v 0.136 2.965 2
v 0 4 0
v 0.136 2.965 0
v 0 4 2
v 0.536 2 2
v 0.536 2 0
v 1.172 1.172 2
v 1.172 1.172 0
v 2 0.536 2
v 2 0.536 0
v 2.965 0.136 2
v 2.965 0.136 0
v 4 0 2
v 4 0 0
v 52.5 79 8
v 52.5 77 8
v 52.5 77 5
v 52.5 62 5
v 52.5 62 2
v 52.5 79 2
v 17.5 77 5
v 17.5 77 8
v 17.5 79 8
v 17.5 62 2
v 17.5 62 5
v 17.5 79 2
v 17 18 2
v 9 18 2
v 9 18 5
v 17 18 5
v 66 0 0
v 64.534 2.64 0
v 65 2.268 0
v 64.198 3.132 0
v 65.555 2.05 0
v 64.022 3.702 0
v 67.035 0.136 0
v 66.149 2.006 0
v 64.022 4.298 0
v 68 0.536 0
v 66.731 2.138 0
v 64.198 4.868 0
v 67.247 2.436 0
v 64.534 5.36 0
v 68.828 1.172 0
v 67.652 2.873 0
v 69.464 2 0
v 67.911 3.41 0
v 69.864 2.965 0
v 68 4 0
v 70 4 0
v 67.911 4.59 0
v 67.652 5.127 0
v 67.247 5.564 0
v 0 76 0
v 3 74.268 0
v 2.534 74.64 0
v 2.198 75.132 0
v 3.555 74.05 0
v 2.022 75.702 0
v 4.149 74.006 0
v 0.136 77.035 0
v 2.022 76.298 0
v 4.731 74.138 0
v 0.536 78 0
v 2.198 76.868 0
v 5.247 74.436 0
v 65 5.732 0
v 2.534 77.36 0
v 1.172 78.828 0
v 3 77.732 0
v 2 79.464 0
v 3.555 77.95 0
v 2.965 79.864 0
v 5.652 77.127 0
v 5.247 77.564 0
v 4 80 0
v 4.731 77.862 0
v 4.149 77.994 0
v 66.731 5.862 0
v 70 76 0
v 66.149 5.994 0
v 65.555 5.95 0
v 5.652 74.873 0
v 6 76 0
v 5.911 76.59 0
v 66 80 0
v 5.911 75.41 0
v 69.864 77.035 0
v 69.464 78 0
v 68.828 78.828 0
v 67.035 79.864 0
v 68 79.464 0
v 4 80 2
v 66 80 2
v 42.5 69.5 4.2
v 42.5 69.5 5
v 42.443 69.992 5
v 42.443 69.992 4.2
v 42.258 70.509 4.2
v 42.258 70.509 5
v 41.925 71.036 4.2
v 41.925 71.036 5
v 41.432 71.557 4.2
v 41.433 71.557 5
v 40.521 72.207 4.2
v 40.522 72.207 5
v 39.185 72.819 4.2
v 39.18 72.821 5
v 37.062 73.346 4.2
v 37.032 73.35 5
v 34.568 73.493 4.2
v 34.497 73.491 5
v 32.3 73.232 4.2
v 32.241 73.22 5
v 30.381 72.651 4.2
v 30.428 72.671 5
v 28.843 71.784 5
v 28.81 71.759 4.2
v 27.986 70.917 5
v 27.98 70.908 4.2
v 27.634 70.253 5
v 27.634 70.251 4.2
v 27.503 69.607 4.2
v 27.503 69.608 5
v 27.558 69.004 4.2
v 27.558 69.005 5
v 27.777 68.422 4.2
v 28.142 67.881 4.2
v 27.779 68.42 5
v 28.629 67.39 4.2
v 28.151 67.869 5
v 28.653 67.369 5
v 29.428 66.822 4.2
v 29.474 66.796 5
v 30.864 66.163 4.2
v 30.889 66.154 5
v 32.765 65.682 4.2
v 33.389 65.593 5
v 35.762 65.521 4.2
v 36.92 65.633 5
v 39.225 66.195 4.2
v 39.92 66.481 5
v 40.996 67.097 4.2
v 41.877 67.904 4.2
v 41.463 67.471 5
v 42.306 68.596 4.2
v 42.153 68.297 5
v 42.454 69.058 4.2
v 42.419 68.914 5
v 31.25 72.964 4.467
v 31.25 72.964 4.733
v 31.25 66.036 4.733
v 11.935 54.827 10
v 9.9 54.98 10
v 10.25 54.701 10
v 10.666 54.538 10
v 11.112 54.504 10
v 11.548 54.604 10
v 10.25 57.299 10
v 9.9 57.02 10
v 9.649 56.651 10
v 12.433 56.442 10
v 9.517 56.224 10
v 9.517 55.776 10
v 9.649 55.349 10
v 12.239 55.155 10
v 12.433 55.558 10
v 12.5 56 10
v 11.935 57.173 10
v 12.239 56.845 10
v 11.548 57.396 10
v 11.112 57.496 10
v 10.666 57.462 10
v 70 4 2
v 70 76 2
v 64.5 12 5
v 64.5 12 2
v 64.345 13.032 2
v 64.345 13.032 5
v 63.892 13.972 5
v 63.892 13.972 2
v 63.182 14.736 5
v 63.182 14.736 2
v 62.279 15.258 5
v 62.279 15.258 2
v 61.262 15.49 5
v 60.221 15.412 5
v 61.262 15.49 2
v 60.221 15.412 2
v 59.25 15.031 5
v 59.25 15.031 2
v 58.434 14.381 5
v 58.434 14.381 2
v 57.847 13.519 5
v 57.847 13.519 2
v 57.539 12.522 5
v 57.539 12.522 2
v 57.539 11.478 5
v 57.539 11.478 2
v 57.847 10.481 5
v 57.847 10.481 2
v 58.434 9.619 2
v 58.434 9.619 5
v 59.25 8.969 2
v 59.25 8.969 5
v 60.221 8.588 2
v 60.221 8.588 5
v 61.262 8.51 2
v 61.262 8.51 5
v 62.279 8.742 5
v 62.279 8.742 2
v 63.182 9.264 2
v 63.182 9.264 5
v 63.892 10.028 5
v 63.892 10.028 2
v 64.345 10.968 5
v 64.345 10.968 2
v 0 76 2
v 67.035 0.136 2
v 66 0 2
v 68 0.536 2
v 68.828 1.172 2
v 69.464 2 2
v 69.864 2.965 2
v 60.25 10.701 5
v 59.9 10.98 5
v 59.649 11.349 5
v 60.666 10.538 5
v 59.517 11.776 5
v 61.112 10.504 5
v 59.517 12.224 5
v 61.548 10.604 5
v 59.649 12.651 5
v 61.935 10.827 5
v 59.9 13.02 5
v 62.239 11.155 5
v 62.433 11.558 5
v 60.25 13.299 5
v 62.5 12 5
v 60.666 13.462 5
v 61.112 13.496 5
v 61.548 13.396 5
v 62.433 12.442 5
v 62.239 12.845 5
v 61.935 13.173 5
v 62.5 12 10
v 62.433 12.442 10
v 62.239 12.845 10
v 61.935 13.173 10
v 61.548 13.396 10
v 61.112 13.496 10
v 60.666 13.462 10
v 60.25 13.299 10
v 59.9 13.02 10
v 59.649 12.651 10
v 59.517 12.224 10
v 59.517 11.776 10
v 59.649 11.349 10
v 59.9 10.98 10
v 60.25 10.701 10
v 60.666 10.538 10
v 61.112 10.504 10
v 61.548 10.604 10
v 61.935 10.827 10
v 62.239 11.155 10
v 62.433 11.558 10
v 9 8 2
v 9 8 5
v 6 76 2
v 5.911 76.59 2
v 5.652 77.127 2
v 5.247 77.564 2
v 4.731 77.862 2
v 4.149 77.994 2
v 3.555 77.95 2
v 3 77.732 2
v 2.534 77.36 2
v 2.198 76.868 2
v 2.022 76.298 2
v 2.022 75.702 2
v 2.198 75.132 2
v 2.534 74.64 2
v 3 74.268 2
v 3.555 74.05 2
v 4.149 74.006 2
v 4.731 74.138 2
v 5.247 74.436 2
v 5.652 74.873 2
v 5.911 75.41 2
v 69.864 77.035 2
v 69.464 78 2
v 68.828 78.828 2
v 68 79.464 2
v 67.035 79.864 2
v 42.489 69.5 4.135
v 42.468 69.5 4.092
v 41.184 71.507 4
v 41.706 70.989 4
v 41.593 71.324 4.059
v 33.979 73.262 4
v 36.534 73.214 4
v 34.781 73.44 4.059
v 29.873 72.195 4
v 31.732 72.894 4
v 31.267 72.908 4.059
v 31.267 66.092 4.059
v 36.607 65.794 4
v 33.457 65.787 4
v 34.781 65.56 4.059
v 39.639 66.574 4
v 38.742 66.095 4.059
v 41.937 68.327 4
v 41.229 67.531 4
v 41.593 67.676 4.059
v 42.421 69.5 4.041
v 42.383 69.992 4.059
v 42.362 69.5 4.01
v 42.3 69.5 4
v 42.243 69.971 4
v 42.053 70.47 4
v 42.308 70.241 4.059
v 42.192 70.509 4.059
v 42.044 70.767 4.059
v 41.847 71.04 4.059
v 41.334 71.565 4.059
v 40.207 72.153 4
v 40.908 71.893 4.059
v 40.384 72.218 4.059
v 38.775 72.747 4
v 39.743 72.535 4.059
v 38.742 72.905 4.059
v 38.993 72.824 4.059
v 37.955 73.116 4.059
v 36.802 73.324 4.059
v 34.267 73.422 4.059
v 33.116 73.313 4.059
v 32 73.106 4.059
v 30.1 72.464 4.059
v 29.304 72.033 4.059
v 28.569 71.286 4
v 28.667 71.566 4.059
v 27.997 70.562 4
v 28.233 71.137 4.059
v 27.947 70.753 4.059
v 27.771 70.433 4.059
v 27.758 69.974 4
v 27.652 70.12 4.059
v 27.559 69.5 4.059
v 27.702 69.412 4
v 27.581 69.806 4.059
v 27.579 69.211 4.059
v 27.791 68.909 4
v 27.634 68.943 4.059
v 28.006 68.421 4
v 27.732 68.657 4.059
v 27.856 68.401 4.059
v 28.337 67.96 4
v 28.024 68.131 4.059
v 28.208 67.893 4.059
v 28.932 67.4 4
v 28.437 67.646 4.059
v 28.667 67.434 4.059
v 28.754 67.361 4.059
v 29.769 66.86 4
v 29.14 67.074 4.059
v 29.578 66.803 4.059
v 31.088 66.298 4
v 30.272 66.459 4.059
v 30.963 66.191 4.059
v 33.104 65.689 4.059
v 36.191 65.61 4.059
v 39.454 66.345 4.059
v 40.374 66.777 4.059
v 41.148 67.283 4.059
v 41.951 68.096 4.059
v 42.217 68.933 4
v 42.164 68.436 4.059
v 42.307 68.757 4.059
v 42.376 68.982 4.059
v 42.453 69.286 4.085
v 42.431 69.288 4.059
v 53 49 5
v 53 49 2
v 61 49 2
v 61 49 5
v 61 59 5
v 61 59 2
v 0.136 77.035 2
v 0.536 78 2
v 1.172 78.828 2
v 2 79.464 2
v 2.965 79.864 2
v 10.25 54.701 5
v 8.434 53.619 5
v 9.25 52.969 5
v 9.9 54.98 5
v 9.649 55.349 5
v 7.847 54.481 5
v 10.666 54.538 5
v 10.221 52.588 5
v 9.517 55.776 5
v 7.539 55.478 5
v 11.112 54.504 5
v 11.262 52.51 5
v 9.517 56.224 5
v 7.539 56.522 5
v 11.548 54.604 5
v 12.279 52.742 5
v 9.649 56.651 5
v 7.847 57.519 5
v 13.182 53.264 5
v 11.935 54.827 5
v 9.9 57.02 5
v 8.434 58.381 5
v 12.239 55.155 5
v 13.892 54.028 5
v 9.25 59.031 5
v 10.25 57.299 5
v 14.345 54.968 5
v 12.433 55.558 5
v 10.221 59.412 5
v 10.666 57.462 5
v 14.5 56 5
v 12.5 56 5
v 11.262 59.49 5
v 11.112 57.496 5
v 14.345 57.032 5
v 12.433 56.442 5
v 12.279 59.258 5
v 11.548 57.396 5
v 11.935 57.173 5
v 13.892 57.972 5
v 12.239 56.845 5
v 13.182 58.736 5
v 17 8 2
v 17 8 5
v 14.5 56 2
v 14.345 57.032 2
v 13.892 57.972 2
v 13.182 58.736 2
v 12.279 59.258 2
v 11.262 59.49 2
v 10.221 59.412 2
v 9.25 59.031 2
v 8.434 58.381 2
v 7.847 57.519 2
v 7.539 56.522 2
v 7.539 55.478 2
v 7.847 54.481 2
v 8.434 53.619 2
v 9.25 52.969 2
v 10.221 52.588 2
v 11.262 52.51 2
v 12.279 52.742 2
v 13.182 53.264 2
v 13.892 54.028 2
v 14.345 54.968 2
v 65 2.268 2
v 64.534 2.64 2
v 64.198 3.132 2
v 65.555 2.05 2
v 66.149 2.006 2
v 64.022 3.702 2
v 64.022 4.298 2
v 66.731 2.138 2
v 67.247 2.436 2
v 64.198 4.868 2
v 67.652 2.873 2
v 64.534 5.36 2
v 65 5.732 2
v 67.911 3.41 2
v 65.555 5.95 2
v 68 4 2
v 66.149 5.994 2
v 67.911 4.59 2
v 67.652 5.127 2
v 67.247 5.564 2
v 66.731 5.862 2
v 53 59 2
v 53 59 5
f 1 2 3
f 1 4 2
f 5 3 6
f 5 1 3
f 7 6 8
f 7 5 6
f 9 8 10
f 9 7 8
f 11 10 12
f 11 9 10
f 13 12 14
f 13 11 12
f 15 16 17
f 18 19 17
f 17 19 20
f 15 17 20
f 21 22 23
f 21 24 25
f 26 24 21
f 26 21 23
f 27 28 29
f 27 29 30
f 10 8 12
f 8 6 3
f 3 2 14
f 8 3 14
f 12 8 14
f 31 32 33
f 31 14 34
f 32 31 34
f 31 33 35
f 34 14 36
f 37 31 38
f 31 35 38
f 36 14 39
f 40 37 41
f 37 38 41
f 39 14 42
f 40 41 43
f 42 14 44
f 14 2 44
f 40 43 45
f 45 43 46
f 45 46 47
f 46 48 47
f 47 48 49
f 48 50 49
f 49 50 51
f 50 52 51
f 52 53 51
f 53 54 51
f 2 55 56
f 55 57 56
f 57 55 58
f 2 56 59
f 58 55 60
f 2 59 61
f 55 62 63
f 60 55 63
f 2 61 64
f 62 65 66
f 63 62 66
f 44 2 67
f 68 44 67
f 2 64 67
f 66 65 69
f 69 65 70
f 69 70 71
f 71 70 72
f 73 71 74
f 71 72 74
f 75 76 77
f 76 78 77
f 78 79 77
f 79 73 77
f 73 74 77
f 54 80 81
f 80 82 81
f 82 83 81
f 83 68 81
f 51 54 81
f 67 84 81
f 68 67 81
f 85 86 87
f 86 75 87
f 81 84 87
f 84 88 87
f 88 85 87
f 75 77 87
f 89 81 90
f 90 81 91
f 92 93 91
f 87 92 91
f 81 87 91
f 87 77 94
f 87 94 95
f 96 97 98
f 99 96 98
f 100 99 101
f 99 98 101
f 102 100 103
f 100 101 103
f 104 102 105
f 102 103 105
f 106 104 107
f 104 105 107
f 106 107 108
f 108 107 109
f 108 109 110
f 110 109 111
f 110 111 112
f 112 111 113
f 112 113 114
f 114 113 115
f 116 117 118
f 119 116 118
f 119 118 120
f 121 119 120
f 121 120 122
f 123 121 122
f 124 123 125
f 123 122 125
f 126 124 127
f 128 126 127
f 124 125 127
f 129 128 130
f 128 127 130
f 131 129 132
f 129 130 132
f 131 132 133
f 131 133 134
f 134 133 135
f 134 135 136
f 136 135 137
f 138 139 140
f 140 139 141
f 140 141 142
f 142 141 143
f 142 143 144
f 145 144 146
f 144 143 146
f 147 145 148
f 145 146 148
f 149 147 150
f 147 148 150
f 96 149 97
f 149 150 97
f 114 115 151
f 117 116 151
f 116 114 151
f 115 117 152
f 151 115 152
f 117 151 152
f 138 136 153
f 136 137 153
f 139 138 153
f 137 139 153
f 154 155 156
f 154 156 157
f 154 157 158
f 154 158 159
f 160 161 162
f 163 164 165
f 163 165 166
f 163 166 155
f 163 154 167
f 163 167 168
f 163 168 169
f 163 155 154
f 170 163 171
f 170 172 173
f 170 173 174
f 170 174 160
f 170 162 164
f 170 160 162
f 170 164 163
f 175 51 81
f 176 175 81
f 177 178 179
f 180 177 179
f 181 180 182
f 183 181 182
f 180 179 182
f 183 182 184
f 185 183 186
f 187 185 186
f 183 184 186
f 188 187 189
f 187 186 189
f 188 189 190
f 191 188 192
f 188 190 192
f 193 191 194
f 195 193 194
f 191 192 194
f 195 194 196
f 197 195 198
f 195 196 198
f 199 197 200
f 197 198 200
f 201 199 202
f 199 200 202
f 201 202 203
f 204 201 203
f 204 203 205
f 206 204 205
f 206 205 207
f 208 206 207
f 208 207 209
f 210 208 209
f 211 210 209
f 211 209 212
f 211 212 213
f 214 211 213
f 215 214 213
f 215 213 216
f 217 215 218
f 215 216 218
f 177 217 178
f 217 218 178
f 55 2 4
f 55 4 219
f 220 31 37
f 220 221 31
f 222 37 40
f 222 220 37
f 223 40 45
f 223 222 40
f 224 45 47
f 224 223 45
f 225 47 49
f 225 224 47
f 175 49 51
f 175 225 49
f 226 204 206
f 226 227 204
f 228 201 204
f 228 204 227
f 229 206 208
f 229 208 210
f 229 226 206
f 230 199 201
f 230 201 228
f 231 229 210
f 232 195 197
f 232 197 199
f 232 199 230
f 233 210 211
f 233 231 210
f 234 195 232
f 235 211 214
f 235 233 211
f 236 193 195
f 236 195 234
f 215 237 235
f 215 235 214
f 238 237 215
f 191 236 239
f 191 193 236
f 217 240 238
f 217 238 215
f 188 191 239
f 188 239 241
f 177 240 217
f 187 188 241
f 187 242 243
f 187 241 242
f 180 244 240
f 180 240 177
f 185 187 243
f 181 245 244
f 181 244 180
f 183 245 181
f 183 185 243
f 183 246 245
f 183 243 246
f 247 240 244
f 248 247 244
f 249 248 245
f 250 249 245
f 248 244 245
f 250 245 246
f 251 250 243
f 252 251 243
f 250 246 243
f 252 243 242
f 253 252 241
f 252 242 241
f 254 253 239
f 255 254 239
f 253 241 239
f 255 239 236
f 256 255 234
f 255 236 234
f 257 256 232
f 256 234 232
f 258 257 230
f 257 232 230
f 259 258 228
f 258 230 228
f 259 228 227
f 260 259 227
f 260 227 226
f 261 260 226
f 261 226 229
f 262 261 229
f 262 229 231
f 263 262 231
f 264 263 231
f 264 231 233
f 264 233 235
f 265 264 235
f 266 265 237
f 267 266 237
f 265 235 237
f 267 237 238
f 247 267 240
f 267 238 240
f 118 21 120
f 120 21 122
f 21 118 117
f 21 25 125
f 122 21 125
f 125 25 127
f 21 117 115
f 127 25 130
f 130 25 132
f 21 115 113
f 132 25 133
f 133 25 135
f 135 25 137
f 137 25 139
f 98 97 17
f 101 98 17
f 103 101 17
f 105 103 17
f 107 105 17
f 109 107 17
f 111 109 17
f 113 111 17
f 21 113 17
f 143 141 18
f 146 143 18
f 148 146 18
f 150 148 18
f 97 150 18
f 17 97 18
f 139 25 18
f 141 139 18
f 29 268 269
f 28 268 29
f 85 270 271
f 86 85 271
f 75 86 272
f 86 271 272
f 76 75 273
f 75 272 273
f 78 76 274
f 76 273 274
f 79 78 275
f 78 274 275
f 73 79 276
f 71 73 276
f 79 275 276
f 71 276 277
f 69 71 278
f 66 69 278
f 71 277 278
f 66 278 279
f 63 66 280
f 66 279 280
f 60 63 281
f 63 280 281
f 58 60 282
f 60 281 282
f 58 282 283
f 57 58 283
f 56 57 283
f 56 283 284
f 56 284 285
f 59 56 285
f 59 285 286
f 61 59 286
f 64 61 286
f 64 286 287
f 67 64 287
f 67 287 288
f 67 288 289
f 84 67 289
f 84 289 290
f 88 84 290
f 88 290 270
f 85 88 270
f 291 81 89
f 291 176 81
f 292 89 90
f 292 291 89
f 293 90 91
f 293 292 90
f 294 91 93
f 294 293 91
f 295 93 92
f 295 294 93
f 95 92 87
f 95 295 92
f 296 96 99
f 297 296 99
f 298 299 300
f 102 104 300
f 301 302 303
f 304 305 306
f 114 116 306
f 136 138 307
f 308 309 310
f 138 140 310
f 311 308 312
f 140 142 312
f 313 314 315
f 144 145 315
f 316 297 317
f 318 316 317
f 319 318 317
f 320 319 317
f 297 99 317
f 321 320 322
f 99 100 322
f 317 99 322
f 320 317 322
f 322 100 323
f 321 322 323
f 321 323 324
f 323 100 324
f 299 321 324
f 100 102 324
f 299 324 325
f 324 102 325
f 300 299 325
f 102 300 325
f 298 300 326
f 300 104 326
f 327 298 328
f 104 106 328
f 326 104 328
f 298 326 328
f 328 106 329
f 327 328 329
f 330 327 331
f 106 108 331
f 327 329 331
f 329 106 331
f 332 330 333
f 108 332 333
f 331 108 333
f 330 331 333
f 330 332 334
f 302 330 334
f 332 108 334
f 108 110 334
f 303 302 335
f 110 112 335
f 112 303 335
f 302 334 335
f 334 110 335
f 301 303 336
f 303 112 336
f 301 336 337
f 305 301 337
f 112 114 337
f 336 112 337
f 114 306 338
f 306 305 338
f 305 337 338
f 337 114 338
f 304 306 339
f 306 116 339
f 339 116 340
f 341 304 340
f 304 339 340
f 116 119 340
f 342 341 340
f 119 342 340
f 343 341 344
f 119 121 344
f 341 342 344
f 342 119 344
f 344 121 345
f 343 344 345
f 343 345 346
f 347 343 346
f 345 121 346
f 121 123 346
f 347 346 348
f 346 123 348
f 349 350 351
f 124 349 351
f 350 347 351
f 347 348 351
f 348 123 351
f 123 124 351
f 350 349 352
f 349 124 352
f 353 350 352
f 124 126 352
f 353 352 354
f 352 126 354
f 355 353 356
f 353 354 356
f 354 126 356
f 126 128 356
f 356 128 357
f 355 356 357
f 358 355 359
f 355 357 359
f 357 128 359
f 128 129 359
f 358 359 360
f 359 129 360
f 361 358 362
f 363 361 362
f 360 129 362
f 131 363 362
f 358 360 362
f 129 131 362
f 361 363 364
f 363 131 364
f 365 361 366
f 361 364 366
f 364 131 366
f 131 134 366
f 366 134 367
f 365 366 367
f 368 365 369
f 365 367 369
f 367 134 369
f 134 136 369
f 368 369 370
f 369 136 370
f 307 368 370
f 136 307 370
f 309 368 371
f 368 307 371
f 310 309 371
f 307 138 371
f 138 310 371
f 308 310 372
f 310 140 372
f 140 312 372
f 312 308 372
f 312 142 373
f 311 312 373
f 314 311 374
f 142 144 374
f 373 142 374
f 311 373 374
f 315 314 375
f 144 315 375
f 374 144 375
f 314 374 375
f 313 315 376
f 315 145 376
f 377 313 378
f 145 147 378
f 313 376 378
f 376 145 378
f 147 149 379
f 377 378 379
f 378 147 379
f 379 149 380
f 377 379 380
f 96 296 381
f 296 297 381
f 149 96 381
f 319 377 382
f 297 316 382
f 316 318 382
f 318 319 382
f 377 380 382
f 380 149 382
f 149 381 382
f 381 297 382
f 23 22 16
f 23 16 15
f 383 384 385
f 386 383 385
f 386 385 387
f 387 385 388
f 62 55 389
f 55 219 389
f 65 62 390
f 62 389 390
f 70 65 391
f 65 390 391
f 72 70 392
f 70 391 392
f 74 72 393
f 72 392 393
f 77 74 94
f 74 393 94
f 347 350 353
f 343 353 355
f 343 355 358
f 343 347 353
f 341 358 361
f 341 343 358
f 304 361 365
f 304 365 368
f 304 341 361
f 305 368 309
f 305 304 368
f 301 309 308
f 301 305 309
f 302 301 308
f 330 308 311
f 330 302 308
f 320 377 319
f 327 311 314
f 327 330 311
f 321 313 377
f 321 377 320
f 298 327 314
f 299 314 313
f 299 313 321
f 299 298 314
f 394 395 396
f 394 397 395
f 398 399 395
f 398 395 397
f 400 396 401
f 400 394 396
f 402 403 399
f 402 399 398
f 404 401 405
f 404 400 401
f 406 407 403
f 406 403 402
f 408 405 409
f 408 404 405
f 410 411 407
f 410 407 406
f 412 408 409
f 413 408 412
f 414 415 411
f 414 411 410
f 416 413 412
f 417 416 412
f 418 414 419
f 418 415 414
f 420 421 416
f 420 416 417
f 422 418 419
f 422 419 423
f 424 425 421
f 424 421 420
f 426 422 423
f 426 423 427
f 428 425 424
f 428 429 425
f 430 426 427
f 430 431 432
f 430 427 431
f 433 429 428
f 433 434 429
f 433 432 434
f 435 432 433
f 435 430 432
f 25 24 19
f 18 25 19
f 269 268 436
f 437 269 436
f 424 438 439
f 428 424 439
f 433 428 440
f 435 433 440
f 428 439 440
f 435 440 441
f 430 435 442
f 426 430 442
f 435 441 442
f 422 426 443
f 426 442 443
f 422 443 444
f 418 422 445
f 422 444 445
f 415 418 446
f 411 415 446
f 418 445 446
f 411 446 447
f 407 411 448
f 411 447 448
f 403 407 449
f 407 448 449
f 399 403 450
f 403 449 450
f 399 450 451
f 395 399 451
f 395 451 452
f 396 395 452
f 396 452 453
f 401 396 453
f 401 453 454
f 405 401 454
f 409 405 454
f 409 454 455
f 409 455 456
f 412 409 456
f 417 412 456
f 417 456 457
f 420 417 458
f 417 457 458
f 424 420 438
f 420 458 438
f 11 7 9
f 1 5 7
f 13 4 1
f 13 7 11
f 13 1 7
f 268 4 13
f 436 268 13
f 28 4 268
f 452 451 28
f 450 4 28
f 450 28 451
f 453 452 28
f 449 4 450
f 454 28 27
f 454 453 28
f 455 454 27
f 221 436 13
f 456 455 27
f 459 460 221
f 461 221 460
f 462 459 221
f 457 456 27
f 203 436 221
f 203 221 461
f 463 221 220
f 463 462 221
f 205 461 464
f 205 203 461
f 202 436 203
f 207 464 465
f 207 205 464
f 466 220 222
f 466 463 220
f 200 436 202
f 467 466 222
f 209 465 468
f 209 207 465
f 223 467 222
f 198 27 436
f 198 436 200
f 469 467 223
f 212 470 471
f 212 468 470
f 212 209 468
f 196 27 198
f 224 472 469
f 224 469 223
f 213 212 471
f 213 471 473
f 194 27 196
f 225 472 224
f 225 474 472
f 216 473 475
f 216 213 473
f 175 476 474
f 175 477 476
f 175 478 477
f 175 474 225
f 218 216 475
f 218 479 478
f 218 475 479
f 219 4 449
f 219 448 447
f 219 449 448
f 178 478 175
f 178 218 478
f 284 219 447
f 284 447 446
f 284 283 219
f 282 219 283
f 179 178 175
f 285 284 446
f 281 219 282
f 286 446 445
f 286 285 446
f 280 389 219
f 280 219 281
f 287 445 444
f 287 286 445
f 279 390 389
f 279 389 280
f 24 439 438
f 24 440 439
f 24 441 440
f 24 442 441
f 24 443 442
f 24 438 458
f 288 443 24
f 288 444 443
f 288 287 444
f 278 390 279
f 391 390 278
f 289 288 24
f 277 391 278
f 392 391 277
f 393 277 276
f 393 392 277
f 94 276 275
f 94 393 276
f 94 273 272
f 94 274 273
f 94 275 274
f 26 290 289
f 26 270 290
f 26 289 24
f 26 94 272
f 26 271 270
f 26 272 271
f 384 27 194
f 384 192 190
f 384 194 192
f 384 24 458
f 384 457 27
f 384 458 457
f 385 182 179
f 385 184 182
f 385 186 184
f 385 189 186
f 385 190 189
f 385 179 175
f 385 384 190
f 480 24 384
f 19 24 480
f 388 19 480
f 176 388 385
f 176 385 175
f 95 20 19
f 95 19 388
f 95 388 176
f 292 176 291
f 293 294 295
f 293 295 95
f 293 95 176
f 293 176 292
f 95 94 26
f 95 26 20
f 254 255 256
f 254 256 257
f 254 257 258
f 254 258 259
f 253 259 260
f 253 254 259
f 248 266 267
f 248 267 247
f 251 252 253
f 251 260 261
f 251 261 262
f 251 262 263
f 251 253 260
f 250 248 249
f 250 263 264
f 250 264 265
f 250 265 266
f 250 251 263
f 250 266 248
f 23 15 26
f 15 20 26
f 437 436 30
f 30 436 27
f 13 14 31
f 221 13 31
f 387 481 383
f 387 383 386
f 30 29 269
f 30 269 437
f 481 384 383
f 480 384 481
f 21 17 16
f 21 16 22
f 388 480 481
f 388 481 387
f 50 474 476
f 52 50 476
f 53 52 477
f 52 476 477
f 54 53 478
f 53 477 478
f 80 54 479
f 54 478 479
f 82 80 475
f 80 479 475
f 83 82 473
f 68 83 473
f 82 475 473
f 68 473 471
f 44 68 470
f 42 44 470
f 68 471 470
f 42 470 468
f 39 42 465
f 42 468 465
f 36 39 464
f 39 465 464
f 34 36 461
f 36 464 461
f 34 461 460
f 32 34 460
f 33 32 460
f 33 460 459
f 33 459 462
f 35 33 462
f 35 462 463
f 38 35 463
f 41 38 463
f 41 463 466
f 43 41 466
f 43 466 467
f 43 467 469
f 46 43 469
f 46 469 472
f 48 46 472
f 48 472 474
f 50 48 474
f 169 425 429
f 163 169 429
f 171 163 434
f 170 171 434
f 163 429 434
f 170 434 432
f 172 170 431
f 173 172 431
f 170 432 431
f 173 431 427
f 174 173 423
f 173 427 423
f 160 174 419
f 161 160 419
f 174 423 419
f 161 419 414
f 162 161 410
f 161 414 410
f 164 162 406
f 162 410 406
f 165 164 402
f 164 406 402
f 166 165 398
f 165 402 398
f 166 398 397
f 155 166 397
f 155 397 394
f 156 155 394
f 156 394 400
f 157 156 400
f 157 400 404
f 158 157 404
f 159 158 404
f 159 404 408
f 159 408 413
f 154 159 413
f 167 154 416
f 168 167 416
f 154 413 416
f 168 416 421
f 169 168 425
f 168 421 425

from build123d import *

# Parameters (mm, degrees)
SKETCH_W        = 70
SKETCH_H        = 80
PAD_DEPTH       = 2
SKETCH001_R     = 3.5
PAD001_DEPTH    = 3
SKETCH002_R     = 1.5
PAD002_DEPTH    = 5
SKETCH003_W     = 35
SKETCH003_H     = 15
PAD003_DEPTH    = 3
PAD003_FACE12_W = 35
PAD003_FACE12_H = 3
PAD004_DEPTH    = 2
PAD004_FACE18_W = 2
PAD004_FACE18_H = 35
PAD005_DEPTH    = 3
POCKET_DEPTH    = 1
FILLET_R        = 0.2
FILLET001_R     = 4
SKETCH005_R     = 2
HOLE_DEPTH      = 25
SKETCH006_W     = 8
SKETCH006_H     = 10
PAD006_DEPTH    = 3


with BuildPart() as part:
    # Sketch → Pad (new body)
    with BuildSketch(Plane.XY):
        with Locations((35, 40)):
            Rectangle(SKETCH_W, SKETCH_H)
    extrude(amount=PAD_DEPTH)

    # Sketch001 (on Face6 of Pad) → Pad001 (join)
    with BuildSketch(Plane.XY.offset(2)):
        with Locations((11, 56)):
            Circle(SKETCH001_R)
        with Locations((61, 12)):
            Circle(SKETCH001_R)
    extrude(amount=PAD001_DEPTH)

    # Sketch002 (on Face10 of Pad001) → Pad002 (join)
    with BuildSketch(Plane.XY.offset(5)):
        with Locations((11, 56)):
            Circle(SKETCH002_R)
        with Locations((61, 12)):
            Circle(SKETCH002_R)
    extrude(amount=PAD002_DEPTH)

    # Sketch003 (on Face5 of Pad002) → Pad003 (join)
    with BuildSketch(Plane.XY.offset(2)):
        with Locations((35, 69.5)):
            Rectangle(SKETCH003_W, SKETCH003_H)
    extrude(amount=PAD003_DEPTH)

    # Pad003 Face12 → Pad004 (add)
    with BuildSketch(Plane(origin=(35, 77, 3.5), x_dir=(1, 0, 0), z_dir=(0, 1, 0))):
        Rectangle(PAD003_FACE12_W, PAD003_FACE12_H)
    extrude(amount=PAD004_DEPTH)

    # Pad004 Face18 → Pad005 (add)
    with BuildSketch(Plane(origin=(35, 78, 5), x_dir=(0, 1, 0), z_dir=(0, 0, 1))):
        Rectangle(PAD004_FACE18_W, PAD004_FACE18_H)
    extrude(amount=PAD005_DEPTH)

    # Sketch004 (on Face17 of Pad005) → Pocket (cut)
    with BuildSketch(Plane.XY.offset(5)):
        with BuildLine():
            add(Edge.make_bspline(
                [(42.5, 69.5), (42.5, 76.428203), (31.25, 72.964102), (20, 69.5), (31.25, 66.035898), (42.5, 62.571797), (42.5, 69.5)],
                knots=[0, 0, 0, 2.094395, 2.094395, 4.18879, 4.18879, 6.283185, 6.283185, 6.283185], degree=2, weights=[1, 0.5, 1, 0.5, 1, 0.5, 1]))
        make_face()
    extrude(amount=-POCKET_DEPTH, mode=Mode.SUBTRACT)

    # Fillet
    fillet_edges = [part.edges().sort_by_distance(p)[0] for p in [
        (27.500079, 69.481686, 4),
    ]]
    fillet(fillet_edges, radius=FILLET_R)

    # Fillet001
    fillet001_edges = [part.edges().sort_by_distance(p)[0] for p in [
        (0, 0, 1),
        (70, 0, 1),
        (70, 80, 1),
        (0, 80, 1),
    ]]
    fillet(fillet001_edges, radius=FILLET001_R)

    # Sketch005 (on Face1 of Fillet001) → Hole (cut)
    with BuildSketch(Plane.XY.offset(2)):
        with Locations((4, 76)):
            Circle(SKETCH005_R)
        with Locations((66, 4)):
            Circle(SKETCH005_R)
    extrude(amount=-HOLE_DEPTH, mode=Mode.SUBTRACT)

    # Sketch006 (on Face1 of Hole) → Pad006 (join)
    with BuildSketch(Plane.XY.offset(2)):
        with Locations((57, 54)):
            Rectangle(SKETCH006_W, SKETCH006_H)
        with Locations((13, 13)):
            Rectangle(SKETCH006_W, SKETCH006_H)
    extrude(amount=PAD006_DEPTH)


solid = part.part
